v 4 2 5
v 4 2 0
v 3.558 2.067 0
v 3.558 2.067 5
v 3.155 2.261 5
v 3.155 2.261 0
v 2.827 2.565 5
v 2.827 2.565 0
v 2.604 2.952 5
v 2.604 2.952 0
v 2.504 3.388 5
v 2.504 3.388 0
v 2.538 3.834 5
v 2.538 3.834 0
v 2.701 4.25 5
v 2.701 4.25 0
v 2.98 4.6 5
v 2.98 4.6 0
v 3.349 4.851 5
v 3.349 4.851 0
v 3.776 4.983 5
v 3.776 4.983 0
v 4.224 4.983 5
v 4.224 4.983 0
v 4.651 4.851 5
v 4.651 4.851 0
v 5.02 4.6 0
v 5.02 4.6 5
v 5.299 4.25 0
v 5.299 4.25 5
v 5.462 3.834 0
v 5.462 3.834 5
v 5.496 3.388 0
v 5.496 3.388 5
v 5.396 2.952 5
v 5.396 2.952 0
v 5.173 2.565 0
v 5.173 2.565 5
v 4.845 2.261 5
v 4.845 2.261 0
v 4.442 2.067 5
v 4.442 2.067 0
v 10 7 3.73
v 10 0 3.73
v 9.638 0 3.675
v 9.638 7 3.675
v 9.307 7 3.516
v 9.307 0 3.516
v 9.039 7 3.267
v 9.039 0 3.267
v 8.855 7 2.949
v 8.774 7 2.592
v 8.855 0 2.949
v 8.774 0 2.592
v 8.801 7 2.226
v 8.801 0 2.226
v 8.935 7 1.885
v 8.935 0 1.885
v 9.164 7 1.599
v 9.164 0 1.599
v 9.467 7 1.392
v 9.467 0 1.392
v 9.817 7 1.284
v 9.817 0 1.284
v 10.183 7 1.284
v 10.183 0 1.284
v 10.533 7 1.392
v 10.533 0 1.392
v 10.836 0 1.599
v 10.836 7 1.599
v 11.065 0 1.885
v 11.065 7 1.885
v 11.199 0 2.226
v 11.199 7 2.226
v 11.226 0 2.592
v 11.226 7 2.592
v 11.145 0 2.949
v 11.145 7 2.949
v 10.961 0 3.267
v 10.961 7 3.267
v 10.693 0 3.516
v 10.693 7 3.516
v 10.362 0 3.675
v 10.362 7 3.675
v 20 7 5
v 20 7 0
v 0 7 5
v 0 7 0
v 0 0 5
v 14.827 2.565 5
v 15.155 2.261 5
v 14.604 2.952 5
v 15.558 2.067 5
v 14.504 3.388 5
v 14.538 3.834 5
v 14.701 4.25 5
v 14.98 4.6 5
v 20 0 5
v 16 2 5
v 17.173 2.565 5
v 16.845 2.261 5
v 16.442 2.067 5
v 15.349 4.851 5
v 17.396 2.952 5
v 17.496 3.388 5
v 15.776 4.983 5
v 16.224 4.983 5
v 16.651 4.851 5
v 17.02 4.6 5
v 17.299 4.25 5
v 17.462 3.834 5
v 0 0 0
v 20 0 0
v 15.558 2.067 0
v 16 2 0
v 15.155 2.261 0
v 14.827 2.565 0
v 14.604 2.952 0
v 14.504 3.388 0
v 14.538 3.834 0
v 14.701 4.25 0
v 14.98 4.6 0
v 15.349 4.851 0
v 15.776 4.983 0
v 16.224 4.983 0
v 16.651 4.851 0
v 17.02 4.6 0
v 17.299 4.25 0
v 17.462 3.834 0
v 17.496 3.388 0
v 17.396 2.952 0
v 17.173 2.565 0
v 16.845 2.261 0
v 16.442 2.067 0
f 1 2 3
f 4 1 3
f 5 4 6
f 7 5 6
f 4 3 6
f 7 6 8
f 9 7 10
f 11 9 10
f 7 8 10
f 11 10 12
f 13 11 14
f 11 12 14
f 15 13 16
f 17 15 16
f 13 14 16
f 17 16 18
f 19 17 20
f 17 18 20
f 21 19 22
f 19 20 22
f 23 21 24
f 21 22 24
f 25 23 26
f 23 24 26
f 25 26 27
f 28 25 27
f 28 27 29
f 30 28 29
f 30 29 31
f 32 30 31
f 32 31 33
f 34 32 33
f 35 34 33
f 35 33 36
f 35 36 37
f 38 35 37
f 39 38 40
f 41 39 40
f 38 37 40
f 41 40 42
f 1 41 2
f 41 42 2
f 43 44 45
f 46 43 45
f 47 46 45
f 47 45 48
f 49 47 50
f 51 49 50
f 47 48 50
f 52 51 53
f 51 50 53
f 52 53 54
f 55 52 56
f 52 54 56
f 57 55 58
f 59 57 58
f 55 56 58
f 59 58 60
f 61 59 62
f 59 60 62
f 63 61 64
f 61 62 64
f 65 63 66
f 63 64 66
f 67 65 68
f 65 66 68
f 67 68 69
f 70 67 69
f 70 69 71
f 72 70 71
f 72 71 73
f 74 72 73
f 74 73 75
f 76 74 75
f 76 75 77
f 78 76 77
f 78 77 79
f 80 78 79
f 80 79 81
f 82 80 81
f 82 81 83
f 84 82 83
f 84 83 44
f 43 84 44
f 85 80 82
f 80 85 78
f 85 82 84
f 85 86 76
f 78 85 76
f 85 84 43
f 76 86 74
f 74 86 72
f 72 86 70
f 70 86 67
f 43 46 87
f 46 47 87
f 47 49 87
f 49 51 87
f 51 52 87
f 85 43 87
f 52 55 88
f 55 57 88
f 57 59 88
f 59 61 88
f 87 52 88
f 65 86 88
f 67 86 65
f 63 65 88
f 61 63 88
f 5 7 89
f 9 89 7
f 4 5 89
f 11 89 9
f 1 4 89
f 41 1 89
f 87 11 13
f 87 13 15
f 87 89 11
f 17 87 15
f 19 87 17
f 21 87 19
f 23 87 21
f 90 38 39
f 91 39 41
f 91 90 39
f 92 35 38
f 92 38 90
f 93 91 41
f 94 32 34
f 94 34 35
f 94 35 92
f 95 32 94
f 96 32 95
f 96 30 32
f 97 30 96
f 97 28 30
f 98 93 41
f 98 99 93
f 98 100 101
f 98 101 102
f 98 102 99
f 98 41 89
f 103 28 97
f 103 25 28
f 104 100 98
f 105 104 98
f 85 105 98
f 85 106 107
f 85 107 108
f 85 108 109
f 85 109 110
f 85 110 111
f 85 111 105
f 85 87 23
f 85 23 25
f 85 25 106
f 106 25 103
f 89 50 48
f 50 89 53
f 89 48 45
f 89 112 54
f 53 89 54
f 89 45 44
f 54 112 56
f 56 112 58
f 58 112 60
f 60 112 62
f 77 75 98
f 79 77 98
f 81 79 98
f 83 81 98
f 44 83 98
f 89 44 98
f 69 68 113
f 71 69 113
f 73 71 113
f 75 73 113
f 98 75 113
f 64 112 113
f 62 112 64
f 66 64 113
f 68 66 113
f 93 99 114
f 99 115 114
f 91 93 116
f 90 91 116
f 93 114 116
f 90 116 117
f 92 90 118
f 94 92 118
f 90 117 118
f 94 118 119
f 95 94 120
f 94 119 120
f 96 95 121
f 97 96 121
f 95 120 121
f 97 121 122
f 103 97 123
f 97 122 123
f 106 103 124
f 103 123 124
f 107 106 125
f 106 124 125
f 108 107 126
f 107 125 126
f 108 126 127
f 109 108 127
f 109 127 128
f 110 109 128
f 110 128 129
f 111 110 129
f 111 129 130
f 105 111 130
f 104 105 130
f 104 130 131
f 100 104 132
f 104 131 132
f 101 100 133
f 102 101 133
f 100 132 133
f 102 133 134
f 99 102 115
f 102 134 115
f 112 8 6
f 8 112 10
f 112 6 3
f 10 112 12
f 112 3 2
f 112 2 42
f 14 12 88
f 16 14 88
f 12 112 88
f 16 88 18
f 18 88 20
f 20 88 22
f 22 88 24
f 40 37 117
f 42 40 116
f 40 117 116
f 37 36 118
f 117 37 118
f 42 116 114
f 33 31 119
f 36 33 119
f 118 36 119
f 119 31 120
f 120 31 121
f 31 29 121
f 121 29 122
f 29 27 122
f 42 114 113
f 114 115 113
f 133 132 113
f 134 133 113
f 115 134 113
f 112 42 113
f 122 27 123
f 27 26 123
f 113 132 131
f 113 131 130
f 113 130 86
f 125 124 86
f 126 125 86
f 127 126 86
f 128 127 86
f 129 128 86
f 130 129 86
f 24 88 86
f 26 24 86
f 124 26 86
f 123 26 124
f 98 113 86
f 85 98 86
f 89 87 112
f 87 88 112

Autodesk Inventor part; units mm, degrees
ref_plane "YZ Plane" through (0, 0, 0) normal (1, 0, 0) x (0, 1, 0)
ref_plane "XZ Plane" through (0, 0, 0) normal (0, 1, 0) x (-1, 0, 0)
ref_plane "XY Plane" through (0, 0, 0) normal (0, 0, 1) x (1, 0, 0)
sketch "スケッチ1" plane through (0, 0, 0) normal (0, 0, 1) x (1, 0, 0)
  line L0 (0, 0) -> (20, 0)
  line L1 (20, 0) -> (20, 7)
  line L2 (20, 7) -> (0, 7)
  line L3 (0, 7) -> (0, 0)
  dimension "d0" = 7
  dimension "d1" = 20
extrude "押し出し1" add sketch "スケッチ1" along normal blind 5
sketch "スケッチ2" plane through (0, 7, 0) normal (0, 1, 0) x (1, 0, 0)
  line L0 (20, 0) -> (0, 0) projected
  point P0 (10, -2.5)
  dimension "d4" = 2.5
hole "穴1" at (10, 7, 2.5) direction (0, -1, 0) diameter 2.459 end through all thread size "M3x0.5" class "6H" standard "ISO Metric profile"
sketch "スケッチ3" plane through (0, 0, 5) normal (0, 0, 1) x (1, 0, 0)
  line L0 (8.7705, 7) -> (11.2295, 7) projected
  line L1 (10, 7) -> (10, 0)
  line L2 (20, 7) -> (0, 7) projected
  point P0 (0, 0)
  point P1 (4, 3.5)
  point P2 (16, 3.5)
  dimension "d12" = 6
  dimension "d13" = 3.5
hole "穴2" at (4, 3.5, 5) at (16, 3.5, 5) direction (0, 0, -1) diameter 3 depth 20 tip angle 118
properties part number "シリンダーの先に着けるやつ"
